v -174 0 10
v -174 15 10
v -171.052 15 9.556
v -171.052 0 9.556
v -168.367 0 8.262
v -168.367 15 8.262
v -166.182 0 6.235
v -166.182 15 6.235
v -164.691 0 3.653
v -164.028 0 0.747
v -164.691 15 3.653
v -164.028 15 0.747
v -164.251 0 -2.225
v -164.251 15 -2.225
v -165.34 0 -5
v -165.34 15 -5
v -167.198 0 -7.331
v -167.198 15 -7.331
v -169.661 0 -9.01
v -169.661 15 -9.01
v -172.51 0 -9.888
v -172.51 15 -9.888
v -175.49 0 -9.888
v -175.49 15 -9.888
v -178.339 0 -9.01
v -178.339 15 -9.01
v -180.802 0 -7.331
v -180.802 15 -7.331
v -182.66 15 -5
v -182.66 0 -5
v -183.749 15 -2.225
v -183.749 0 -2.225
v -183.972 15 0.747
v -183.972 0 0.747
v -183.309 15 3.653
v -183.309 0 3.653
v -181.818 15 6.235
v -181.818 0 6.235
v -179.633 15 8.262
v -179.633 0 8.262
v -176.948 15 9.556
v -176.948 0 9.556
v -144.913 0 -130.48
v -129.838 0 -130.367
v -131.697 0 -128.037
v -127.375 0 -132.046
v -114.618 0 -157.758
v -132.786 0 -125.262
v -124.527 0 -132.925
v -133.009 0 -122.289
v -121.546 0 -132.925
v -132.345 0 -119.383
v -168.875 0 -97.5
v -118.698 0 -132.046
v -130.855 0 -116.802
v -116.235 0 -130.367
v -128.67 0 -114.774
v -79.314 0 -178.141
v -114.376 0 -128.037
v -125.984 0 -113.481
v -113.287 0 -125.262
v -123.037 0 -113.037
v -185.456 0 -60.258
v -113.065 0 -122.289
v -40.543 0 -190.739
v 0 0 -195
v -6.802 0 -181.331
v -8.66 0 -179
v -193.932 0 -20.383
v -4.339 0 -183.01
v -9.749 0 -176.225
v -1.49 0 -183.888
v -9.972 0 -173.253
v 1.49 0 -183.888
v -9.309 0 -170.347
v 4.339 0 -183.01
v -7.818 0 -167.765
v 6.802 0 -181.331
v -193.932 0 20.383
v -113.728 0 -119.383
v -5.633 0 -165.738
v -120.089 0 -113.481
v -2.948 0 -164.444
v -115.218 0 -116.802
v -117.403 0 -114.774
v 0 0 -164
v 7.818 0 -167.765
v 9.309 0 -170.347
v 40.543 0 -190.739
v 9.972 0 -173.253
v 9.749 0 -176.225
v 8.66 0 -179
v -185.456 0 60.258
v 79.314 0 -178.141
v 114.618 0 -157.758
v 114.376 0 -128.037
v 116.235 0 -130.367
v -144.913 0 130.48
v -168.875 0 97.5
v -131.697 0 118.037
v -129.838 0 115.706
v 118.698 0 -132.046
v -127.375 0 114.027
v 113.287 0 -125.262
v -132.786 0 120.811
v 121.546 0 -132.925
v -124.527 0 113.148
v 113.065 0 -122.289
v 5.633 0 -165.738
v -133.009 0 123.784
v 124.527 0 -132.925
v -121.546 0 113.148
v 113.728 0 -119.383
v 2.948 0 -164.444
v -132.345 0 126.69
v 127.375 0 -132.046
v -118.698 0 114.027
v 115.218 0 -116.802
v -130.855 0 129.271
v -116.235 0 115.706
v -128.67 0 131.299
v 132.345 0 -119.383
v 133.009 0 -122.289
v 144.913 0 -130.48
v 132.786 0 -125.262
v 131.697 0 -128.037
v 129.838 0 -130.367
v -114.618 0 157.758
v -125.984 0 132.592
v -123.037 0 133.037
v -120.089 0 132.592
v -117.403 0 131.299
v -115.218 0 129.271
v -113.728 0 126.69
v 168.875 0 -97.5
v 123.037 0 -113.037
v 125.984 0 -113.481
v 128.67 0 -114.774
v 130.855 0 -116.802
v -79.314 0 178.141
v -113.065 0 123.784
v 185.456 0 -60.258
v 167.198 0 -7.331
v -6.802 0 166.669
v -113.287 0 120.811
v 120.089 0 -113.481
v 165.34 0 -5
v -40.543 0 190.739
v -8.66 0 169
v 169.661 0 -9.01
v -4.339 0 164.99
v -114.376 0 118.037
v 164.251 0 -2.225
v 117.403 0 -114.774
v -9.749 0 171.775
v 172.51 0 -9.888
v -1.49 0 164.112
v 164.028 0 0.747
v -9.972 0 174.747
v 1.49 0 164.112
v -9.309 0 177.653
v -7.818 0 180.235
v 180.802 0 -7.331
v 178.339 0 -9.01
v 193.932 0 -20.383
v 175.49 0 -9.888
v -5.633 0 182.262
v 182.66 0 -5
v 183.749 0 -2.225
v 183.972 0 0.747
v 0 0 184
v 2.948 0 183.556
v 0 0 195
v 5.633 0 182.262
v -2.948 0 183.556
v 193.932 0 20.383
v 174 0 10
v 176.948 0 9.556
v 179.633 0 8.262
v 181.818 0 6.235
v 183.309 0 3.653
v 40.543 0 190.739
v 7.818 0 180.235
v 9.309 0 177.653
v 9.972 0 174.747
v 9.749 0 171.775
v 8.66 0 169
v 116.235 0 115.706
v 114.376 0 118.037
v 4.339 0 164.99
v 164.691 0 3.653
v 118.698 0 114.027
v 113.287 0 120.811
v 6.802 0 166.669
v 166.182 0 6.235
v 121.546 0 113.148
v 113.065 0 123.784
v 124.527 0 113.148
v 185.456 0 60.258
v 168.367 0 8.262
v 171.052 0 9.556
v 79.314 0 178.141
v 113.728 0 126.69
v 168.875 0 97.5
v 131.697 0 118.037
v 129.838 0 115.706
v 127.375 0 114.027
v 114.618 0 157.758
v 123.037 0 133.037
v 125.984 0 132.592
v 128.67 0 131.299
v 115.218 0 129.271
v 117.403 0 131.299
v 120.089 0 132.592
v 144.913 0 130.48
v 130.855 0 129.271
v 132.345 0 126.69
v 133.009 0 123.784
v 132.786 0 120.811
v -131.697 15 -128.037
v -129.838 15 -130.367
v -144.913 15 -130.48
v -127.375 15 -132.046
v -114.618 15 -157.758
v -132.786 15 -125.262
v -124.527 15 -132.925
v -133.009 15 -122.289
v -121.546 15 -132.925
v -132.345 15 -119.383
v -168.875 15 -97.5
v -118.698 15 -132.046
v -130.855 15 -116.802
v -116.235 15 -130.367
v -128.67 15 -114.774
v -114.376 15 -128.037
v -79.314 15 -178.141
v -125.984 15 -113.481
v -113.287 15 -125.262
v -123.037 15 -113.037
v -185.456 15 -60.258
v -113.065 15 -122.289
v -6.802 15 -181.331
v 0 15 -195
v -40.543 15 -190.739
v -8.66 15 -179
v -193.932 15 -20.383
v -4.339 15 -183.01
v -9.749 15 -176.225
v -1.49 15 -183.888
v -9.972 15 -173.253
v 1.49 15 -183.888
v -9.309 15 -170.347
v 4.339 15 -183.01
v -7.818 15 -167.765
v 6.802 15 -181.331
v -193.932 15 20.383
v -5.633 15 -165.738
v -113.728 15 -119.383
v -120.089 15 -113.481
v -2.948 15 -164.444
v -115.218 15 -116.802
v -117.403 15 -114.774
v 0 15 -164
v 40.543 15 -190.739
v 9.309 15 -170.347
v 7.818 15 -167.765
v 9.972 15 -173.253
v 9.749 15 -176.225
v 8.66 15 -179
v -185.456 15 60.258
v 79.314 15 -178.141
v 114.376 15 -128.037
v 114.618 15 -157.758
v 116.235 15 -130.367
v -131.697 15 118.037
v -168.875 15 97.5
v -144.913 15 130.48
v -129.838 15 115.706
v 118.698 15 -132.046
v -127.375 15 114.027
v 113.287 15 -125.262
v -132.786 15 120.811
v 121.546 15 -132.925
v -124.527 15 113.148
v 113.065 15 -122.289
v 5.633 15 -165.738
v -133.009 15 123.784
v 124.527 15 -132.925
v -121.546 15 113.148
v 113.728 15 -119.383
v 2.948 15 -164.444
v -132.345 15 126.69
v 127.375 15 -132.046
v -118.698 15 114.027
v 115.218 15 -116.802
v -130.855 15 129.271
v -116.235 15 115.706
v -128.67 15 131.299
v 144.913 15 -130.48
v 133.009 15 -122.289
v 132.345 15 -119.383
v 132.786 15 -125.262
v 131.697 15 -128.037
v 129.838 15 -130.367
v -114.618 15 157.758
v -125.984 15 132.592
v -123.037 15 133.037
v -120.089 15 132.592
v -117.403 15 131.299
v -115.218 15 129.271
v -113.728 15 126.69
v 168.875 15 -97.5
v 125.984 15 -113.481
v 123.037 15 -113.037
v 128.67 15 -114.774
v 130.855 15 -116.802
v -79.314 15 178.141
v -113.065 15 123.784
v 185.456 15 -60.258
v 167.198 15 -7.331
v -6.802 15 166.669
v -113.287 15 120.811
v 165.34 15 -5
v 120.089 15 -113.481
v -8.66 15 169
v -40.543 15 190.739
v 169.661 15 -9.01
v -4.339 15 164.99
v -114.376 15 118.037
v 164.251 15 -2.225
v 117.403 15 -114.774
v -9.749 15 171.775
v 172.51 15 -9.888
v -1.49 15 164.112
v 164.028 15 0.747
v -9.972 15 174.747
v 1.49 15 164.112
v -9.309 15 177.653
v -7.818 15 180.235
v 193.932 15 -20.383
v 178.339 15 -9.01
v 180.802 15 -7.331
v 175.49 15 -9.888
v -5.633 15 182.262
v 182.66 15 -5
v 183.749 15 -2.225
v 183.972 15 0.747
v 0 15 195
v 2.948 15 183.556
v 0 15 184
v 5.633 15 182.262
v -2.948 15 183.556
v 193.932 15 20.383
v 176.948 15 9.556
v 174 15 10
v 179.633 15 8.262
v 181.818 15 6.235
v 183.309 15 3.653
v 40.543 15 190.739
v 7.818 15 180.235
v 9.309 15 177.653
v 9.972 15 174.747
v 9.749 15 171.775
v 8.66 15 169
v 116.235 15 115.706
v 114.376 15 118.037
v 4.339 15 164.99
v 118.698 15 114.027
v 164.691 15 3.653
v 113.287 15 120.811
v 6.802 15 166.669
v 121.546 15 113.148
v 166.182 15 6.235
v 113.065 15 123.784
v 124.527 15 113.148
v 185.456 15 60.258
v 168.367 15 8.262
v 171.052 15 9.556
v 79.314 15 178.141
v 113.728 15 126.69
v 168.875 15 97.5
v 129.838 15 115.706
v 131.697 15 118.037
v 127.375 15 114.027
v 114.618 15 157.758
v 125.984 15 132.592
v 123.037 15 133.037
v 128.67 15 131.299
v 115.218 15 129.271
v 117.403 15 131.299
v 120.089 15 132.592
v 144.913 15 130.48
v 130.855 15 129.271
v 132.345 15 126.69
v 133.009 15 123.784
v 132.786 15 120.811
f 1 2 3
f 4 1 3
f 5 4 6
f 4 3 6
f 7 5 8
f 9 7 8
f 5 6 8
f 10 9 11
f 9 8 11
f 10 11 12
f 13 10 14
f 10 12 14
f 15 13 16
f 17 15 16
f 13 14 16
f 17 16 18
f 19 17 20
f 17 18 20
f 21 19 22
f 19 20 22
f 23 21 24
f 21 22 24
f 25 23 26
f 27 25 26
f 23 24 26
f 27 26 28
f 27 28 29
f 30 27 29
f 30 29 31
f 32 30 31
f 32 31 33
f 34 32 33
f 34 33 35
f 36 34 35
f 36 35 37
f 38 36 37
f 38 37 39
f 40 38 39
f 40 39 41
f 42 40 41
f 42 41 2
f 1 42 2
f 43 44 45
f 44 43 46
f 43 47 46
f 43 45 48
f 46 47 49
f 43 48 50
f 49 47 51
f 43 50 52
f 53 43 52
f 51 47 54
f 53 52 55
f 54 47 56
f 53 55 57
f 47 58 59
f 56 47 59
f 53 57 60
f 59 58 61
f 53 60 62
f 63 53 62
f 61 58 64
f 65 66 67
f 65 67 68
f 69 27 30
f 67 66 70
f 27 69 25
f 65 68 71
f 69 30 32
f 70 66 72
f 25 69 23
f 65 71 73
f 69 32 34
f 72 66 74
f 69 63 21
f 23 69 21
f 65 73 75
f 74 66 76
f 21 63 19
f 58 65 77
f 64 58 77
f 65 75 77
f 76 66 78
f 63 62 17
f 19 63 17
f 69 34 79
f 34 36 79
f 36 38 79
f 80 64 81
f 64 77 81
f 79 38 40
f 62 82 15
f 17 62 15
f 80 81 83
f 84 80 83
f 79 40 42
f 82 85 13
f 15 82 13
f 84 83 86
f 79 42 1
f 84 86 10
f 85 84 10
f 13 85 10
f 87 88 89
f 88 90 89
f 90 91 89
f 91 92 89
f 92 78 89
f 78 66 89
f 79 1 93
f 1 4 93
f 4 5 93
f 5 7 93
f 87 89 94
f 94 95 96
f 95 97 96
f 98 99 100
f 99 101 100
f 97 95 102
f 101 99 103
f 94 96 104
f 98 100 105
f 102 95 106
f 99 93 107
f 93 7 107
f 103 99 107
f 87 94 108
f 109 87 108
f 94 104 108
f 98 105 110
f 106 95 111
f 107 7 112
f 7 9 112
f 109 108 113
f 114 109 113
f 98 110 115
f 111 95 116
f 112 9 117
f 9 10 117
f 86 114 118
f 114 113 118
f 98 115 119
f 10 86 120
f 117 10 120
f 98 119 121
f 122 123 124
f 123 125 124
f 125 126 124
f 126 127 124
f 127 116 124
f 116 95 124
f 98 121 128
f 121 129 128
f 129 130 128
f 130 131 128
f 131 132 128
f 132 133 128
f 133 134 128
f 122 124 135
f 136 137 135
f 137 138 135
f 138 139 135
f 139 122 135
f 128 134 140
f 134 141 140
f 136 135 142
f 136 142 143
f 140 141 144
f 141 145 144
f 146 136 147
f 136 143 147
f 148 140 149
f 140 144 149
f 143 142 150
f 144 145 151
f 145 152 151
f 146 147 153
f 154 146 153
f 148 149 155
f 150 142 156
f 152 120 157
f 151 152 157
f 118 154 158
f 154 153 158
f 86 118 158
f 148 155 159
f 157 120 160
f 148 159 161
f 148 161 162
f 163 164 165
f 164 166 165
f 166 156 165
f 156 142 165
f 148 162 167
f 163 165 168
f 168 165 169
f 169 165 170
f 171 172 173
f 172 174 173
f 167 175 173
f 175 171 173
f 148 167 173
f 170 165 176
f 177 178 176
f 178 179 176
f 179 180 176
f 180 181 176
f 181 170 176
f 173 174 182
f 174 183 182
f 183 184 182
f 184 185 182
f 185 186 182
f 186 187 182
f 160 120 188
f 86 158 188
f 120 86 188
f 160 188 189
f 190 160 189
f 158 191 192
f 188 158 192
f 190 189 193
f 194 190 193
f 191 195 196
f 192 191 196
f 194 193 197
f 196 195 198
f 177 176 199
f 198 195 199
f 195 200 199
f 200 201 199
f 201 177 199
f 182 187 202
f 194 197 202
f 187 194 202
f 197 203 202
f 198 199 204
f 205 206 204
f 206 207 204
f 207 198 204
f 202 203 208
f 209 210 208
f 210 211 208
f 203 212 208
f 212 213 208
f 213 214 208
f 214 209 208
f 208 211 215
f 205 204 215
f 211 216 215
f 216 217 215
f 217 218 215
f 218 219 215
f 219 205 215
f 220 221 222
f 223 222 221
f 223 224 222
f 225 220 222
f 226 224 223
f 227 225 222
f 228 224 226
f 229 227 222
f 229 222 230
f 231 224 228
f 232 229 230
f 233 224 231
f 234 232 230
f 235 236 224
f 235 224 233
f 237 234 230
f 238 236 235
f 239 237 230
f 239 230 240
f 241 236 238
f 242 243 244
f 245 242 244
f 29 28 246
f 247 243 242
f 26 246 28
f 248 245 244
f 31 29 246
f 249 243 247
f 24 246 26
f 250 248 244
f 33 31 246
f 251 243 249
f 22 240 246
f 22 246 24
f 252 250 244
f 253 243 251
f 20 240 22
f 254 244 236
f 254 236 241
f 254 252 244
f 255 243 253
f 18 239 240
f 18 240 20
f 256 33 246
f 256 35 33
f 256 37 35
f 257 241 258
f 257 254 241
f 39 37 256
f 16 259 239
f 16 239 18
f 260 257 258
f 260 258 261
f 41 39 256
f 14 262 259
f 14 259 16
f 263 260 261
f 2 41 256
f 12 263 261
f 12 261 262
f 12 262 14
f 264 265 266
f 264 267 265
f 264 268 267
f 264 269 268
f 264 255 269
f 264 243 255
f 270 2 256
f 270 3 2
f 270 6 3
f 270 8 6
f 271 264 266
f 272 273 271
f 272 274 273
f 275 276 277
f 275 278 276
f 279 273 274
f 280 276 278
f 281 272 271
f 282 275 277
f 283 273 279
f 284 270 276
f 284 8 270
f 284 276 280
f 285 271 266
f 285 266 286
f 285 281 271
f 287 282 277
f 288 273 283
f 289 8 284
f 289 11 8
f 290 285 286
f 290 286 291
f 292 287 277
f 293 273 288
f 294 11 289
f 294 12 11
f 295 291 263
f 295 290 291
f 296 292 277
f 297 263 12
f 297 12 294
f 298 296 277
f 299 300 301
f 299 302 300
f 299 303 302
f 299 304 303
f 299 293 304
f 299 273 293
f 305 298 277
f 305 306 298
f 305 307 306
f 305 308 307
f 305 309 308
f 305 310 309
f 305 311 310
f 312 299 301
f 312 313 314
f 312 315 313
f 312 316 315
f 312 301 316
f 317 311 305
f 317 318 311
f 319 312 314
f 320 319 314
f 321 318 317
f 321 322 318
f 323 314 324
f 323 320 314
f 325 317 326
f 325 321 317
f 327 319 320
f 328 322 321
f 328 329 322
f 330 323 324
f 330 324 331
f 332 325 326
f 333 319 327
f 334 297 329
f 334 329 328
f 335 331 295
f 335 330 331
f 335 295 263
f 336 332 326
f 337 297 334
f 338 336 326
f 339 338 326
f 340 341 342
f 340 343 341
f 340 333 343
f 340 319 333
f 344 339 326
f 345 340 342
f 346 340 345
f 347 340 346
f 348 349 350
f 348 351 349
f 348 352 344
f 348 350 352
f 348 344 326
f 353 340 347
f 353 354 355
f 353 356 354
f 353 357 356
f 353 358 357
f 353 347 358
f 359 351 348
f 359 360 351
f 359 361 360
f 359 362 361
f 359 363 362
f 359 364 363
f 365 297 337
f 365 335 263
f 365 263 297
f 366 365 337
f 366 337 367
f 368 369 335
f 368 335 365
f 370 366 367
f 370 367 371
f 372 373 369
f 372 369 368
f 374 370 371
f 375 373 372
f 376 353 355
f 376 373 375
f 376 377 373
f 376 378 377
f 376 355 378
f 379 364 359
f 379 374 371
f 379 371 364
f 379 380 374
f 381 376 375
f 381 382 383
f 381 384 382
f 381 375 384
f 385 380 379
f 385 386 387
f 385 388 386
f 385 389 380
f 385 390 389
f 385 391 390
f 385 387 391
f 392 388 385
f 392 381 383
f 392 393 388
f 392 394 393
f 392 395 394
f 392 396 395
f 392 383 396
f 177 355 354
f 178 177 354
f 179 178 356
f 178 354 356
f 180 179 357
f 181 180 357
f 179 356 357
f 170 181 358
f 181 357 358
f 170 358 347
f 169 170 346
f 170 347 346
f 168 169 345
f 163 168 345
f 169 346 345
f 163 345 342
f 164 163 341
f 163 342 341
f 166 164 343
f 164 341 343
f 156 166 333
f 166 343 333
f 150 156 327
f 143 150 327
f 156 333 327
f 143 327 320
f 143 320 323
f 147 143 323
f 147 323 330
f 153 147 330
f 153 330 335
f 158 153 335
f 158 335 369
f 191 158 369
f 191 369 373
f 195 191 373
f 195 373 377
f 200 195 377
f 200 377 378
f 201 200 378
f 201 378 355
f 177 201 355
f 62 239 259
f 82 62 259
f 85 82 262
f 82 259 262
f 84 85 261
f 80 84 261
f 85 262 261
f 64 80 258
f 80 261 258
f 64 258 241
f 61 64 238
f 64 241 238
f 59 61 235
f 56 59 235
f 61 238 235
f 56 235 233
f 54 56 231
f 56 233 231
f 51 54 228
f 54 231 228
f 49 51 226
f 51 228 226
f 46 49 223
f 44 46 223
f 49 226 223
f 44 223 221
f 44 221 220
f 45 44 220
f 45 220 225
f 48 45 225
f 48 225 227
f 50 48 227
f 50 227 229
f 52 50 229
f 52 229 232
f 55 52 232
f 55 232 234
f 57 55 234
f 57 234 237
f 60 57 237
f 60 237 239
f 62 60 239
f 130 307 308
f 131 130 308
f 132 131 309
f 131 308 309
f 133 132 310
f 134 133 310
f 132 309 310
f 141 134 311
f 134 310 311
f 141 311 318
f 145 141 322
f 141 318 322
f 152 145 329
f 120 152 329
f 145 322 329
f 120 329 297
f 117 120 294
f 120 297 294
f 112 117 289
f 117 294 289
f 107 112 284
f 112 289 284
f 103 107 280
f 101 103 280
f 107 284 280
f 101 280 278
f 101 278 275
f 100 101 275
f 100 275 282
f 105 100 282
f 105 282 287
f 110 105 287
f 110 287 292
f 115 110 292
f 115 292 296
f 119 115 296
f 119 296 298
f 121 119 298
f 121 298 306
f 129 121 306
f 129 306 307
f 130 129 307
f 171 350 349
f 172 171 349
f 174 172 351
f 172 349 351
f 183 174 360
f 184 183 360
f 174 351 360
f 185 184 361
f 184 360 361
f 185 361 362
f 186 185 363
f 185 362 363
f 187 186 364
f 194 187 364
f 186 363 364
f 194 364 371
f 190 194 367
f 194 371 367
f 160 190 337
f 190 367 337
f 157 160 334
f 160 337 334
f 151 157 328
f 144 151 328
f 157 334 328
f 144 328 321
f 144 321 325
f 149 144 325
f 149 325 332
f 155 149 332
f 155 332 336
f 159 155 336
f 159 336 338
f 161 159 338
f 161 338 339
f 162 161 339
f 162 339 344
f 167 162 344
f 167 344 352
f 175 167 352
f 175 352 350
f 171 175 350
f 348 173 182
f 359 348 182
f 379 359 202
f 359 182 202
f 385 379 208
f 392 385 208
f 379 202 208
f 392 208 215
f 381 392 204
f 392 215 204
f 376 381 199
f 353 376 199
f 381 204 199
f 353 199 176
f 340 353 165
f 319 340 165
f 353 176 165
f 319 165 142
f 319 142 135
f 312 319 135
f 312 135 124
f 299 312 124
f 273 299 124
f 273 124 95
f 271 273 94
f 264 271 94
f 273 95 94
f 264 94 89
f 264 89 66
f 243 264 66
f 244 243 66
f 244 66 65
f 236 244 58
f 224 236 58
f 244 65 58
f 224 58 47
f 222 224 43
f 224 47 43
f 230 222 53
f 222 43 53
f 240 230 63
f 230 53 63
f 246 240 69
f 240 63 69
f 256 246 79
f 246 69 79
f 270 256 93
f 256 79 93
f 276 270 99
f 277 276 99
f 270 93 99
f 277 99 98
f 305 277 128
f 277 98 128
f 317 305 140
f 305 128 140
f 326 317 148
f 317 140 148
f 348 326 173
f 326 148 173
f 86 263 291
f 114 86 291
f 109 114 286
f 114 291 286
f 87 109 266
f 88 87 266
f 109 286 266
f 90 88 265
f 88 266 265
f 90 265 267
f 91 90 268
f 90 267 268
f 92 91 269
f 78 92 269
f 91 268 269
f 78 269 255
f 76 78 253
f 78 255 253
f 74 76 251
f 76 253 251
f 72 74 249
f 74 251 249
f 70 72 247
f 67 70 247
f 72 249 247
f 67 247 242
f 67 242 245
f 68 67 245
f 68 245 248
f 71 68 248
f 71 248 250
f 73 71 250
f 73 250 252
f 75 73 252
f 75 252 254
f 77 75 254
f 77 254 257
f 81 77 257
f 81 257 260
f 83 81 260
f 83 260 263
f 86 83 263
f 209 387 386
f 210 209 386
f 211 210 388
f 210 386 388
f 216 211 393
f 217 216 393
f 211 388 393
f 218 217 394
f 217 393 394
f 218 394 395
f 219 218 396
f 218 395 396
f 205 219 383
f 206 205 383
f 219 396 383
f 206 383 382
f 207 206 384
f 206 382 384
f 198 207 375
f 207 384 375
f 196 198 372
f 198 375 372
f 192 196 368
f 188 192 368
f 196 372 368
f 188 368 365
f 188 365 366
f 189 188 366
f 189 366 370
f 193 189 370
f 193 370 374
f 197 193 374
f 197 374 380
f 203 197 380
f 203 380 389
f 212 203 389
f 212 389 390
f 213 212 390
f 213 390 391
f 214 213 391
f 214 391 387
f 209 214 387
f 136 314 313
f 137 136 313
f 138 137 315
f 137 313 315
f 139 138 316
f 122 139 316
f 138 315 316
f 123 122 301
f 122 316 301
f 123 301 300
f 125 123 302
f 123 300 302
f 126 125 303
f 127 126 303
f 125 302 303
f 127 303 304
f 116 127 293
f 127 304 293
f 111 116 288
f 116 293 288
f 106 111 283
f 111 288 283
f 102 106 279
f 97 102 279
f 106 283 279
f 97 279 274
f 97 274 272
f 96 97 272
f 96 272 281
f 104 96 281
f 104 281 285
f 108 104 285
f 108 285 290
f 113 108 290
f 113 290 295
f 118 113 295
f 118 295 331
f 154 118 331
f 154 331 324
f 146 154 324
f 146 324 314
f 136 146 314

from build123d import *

# Parameters (mm, degrees)
SKETCH_1_R          = 195
EXTRUDE_1_DEPTH     = 15
CUT_EXTRUDE_1_REACH = 278.179
SKETCH_2_R          = 10


with BuildPart() as part:
    # 草图1 → 凸台-拉伸1 (new body)
    with BuildSketch(Plane(origin=(0, 0, 0), x_dir=(1, 0, 0), z_dir=(0, 1, 0))):
        with Locations(Location((0, 0, 0), (0, 0, 270))):
            Circle(SKETCH_1_R)
    extrude(amount=EXTRUDE_1_DEPTH)

    # 草图2 → 切除-拉伸1 (cut, up to next)
    with BuildSketch(Plane(origin=(0, 15, 0), x_dir=(1, 0, 0), z_dir=(0, 1, 0)), mode=Mode.PRIVATE) as cut_extrude_1_sk1:
        with Locations(Location((-174, 0, 0), (0, 0, 270))):
            Circle(SKETCH_2_R)
    cut_extrude_1_tool1 = extrude(cut_extrude_1_sk1.sketch, amount=-CUT_EXTRUDE_1_REACH, mode=Mode.PRIVATE) & part.part
    # 草图2 → 切除-拉伸1 (cut, up to next)
    with BuildSketch(Plane(origin=(0, 15, 0), x_dir=(1, 0, 0), z_dir=(0, 1, 0)), mode=Mode.PRIVATE) as cut_extrude_1_sk2:
        with Locations(Location((-123.036579926, 123.036579926, 0), (0, 0, 270))):
            Circle(SKETCH_2_R)
    cut_extrude_1_tool2 = extrude(cut_extrude_1_sk2.sketch, amount=-CUT_EXTRUDE_1_REACH, mode=Mode.PRIVATE) & part.part
    # 草图2 → 切除-拉伸1 (cut, up to next)
    with BuildSketch(Plane(origin=(0, 15, 0), x_dir=(1, 0, 0), z_dir=(0, 1, 0)), mode=Mode.PRIVATE) as cut_extrude_1_sk3:
        with Locations(Location((0, 174, 0), (0, 0, 270))):
            Circle(SKETCH_2_R)
    cut_extrude_1_tool3 = extrude(cut_extrude_1_sk3.sketch, amount=-CUT_EXTRUDE_1_REACH, mode=Mode.PRIVATE) & part.part
    # 草图2 → 切除-拉伸1 (cut, up to next)
    with BuildSketch(Plane(origin=(0, 15, 0), x_dir=(1, 0, 0), z_dir=(0, 1, 0)), mode=Mode.PRIVATE) as cut_extrude_1_sk4:
        with Locations(Location((123.036579926, 123.036579926, 0), (0, 0, 270))):
            Circle(SKETCH_2_R)
    cut_extrude_1_tool4 = extrude(cut_extrude_1_sk4.sketch, amount=-CUT_EXTRUDE_1_REACH, mode=Mode.PRIVATE) & part.part
    # 草图2 → 切除-拉伸1 (cut, up to next)
    with BuildSketch(Plane(origin=(0, 15, 0), x_dir=(1, 0, 0), z_dir=(0, 1, 0)), mode=Mode.PRIVATE) as cut_extrude_1_sk5:
        with Locations(Location((174, 0, 0), (0, 0, 270))):
            Circle(SKETCH_2_R)
    cut_extrude_1_tool5 = extrude(cut_extrude_1_sk5.sketch, amount=-CUT_EXTRUDE_1_REACH, mode=Mode.PRIVATE) & part.part
    # 草图2 → 切除-拉伸1 (cut, up to next)
    with BuildSketch(Plane(origin=(0, 15, 0), x_dir=(1, 0, 0), z_dir=(0, 1, 0)), mode=Mode.PRIVATE) as cut_extrude_1_sk6:
        with Locations(Location((123.036579926, -123.036579926, 0), (0, 0, 270))):
            Circle(SKETCH_2_R)
    cut_extrude_1_tool6 = extrude(cut_extrude_1_sk6.sketch, amount=-CUT_EXTRUDE_1_REACH, mode=Mode.PRIVATE) & part.part
    # 草图2 → 切除-拉伸1 (cut, up to next)
    with BuildSketch(Plane(origin=(0, 15, 0), x_dir=(1, 0, 0), z_dir=(0, 1, 0)), mode=Mode.PRIVATE) as cut_extrude_1_sk7:
        with Locations(Location((0, -174, 0), (0, 0, 270))):
            Circle(SKETCH_2_R)
    cut_extrude_1_tool7 = extrude(cut_extrude_1_sk7.sketch, amount=-CUT_EXTRUDE_1_REACH, mode=Mode.PRIVATE) & part.part
    # 草图2 → 切除-拉伸1 (cut, up to next)
    with BuildSketch(Plane(origin=(0, 15, 0), x_dir=(1, 0, 0), z_dir=(0, 1, 0)), mode=Mode.PRIVATE) as cut_extrude_1_sk8:
        with Locations(Location((-123.036579926, -123.036579926, 0), (0, 0, 270))):
            Circle(SKETCH_2_R)
    cut_extrude_1_tool8 = extrude(cut_extrude_1_sk8.sketch, amount=-CUT_EXTRUDE_1_REACH, mode=Mode.PRIVATE) & part.part
    add(cut_extrude_1_tool1.solids().sort_by_distance((-174, 15, 0))[0], mode=Mode.SUBTRACT)
    add(cut_extrude_1_tool2.solids().sort_by_distance((-123.03658, 15, -123.03658))[0], mode=Mode.SUBTRACT)
    add(cut_extrude_1_tool3.solids().sort_by_distance((0, 15, -174))[0], mode=Mode.SUBTRACT)
    add(cut_extrude_1_tool4.solids().sort_by_distance((123.03658, 15, -123.03658))[0], mode=Mode.SUBTRACT)
    add(cut_extrude_1_tool5.solids().sort_by_distance((174, 15, 0))[0], mode=Mode.SUBTRACT)
    add(cut_extrude_1_tool6.solids().sort_by_distance((123.03658, 15, 123.03658))[0], mode=Mode.SUBTRACT)
    add(cut_extrude_1_tool7.solids().sort_by_distance((0, 15, 174))[0], mode=Mode.SUBTRACT)
    add(cut_extrude_1_tool8.solids().sort_by_distance((-123.03658, 15, 123.03658))[0], mode=Mode.SUBTRACT)


solid = part.part
